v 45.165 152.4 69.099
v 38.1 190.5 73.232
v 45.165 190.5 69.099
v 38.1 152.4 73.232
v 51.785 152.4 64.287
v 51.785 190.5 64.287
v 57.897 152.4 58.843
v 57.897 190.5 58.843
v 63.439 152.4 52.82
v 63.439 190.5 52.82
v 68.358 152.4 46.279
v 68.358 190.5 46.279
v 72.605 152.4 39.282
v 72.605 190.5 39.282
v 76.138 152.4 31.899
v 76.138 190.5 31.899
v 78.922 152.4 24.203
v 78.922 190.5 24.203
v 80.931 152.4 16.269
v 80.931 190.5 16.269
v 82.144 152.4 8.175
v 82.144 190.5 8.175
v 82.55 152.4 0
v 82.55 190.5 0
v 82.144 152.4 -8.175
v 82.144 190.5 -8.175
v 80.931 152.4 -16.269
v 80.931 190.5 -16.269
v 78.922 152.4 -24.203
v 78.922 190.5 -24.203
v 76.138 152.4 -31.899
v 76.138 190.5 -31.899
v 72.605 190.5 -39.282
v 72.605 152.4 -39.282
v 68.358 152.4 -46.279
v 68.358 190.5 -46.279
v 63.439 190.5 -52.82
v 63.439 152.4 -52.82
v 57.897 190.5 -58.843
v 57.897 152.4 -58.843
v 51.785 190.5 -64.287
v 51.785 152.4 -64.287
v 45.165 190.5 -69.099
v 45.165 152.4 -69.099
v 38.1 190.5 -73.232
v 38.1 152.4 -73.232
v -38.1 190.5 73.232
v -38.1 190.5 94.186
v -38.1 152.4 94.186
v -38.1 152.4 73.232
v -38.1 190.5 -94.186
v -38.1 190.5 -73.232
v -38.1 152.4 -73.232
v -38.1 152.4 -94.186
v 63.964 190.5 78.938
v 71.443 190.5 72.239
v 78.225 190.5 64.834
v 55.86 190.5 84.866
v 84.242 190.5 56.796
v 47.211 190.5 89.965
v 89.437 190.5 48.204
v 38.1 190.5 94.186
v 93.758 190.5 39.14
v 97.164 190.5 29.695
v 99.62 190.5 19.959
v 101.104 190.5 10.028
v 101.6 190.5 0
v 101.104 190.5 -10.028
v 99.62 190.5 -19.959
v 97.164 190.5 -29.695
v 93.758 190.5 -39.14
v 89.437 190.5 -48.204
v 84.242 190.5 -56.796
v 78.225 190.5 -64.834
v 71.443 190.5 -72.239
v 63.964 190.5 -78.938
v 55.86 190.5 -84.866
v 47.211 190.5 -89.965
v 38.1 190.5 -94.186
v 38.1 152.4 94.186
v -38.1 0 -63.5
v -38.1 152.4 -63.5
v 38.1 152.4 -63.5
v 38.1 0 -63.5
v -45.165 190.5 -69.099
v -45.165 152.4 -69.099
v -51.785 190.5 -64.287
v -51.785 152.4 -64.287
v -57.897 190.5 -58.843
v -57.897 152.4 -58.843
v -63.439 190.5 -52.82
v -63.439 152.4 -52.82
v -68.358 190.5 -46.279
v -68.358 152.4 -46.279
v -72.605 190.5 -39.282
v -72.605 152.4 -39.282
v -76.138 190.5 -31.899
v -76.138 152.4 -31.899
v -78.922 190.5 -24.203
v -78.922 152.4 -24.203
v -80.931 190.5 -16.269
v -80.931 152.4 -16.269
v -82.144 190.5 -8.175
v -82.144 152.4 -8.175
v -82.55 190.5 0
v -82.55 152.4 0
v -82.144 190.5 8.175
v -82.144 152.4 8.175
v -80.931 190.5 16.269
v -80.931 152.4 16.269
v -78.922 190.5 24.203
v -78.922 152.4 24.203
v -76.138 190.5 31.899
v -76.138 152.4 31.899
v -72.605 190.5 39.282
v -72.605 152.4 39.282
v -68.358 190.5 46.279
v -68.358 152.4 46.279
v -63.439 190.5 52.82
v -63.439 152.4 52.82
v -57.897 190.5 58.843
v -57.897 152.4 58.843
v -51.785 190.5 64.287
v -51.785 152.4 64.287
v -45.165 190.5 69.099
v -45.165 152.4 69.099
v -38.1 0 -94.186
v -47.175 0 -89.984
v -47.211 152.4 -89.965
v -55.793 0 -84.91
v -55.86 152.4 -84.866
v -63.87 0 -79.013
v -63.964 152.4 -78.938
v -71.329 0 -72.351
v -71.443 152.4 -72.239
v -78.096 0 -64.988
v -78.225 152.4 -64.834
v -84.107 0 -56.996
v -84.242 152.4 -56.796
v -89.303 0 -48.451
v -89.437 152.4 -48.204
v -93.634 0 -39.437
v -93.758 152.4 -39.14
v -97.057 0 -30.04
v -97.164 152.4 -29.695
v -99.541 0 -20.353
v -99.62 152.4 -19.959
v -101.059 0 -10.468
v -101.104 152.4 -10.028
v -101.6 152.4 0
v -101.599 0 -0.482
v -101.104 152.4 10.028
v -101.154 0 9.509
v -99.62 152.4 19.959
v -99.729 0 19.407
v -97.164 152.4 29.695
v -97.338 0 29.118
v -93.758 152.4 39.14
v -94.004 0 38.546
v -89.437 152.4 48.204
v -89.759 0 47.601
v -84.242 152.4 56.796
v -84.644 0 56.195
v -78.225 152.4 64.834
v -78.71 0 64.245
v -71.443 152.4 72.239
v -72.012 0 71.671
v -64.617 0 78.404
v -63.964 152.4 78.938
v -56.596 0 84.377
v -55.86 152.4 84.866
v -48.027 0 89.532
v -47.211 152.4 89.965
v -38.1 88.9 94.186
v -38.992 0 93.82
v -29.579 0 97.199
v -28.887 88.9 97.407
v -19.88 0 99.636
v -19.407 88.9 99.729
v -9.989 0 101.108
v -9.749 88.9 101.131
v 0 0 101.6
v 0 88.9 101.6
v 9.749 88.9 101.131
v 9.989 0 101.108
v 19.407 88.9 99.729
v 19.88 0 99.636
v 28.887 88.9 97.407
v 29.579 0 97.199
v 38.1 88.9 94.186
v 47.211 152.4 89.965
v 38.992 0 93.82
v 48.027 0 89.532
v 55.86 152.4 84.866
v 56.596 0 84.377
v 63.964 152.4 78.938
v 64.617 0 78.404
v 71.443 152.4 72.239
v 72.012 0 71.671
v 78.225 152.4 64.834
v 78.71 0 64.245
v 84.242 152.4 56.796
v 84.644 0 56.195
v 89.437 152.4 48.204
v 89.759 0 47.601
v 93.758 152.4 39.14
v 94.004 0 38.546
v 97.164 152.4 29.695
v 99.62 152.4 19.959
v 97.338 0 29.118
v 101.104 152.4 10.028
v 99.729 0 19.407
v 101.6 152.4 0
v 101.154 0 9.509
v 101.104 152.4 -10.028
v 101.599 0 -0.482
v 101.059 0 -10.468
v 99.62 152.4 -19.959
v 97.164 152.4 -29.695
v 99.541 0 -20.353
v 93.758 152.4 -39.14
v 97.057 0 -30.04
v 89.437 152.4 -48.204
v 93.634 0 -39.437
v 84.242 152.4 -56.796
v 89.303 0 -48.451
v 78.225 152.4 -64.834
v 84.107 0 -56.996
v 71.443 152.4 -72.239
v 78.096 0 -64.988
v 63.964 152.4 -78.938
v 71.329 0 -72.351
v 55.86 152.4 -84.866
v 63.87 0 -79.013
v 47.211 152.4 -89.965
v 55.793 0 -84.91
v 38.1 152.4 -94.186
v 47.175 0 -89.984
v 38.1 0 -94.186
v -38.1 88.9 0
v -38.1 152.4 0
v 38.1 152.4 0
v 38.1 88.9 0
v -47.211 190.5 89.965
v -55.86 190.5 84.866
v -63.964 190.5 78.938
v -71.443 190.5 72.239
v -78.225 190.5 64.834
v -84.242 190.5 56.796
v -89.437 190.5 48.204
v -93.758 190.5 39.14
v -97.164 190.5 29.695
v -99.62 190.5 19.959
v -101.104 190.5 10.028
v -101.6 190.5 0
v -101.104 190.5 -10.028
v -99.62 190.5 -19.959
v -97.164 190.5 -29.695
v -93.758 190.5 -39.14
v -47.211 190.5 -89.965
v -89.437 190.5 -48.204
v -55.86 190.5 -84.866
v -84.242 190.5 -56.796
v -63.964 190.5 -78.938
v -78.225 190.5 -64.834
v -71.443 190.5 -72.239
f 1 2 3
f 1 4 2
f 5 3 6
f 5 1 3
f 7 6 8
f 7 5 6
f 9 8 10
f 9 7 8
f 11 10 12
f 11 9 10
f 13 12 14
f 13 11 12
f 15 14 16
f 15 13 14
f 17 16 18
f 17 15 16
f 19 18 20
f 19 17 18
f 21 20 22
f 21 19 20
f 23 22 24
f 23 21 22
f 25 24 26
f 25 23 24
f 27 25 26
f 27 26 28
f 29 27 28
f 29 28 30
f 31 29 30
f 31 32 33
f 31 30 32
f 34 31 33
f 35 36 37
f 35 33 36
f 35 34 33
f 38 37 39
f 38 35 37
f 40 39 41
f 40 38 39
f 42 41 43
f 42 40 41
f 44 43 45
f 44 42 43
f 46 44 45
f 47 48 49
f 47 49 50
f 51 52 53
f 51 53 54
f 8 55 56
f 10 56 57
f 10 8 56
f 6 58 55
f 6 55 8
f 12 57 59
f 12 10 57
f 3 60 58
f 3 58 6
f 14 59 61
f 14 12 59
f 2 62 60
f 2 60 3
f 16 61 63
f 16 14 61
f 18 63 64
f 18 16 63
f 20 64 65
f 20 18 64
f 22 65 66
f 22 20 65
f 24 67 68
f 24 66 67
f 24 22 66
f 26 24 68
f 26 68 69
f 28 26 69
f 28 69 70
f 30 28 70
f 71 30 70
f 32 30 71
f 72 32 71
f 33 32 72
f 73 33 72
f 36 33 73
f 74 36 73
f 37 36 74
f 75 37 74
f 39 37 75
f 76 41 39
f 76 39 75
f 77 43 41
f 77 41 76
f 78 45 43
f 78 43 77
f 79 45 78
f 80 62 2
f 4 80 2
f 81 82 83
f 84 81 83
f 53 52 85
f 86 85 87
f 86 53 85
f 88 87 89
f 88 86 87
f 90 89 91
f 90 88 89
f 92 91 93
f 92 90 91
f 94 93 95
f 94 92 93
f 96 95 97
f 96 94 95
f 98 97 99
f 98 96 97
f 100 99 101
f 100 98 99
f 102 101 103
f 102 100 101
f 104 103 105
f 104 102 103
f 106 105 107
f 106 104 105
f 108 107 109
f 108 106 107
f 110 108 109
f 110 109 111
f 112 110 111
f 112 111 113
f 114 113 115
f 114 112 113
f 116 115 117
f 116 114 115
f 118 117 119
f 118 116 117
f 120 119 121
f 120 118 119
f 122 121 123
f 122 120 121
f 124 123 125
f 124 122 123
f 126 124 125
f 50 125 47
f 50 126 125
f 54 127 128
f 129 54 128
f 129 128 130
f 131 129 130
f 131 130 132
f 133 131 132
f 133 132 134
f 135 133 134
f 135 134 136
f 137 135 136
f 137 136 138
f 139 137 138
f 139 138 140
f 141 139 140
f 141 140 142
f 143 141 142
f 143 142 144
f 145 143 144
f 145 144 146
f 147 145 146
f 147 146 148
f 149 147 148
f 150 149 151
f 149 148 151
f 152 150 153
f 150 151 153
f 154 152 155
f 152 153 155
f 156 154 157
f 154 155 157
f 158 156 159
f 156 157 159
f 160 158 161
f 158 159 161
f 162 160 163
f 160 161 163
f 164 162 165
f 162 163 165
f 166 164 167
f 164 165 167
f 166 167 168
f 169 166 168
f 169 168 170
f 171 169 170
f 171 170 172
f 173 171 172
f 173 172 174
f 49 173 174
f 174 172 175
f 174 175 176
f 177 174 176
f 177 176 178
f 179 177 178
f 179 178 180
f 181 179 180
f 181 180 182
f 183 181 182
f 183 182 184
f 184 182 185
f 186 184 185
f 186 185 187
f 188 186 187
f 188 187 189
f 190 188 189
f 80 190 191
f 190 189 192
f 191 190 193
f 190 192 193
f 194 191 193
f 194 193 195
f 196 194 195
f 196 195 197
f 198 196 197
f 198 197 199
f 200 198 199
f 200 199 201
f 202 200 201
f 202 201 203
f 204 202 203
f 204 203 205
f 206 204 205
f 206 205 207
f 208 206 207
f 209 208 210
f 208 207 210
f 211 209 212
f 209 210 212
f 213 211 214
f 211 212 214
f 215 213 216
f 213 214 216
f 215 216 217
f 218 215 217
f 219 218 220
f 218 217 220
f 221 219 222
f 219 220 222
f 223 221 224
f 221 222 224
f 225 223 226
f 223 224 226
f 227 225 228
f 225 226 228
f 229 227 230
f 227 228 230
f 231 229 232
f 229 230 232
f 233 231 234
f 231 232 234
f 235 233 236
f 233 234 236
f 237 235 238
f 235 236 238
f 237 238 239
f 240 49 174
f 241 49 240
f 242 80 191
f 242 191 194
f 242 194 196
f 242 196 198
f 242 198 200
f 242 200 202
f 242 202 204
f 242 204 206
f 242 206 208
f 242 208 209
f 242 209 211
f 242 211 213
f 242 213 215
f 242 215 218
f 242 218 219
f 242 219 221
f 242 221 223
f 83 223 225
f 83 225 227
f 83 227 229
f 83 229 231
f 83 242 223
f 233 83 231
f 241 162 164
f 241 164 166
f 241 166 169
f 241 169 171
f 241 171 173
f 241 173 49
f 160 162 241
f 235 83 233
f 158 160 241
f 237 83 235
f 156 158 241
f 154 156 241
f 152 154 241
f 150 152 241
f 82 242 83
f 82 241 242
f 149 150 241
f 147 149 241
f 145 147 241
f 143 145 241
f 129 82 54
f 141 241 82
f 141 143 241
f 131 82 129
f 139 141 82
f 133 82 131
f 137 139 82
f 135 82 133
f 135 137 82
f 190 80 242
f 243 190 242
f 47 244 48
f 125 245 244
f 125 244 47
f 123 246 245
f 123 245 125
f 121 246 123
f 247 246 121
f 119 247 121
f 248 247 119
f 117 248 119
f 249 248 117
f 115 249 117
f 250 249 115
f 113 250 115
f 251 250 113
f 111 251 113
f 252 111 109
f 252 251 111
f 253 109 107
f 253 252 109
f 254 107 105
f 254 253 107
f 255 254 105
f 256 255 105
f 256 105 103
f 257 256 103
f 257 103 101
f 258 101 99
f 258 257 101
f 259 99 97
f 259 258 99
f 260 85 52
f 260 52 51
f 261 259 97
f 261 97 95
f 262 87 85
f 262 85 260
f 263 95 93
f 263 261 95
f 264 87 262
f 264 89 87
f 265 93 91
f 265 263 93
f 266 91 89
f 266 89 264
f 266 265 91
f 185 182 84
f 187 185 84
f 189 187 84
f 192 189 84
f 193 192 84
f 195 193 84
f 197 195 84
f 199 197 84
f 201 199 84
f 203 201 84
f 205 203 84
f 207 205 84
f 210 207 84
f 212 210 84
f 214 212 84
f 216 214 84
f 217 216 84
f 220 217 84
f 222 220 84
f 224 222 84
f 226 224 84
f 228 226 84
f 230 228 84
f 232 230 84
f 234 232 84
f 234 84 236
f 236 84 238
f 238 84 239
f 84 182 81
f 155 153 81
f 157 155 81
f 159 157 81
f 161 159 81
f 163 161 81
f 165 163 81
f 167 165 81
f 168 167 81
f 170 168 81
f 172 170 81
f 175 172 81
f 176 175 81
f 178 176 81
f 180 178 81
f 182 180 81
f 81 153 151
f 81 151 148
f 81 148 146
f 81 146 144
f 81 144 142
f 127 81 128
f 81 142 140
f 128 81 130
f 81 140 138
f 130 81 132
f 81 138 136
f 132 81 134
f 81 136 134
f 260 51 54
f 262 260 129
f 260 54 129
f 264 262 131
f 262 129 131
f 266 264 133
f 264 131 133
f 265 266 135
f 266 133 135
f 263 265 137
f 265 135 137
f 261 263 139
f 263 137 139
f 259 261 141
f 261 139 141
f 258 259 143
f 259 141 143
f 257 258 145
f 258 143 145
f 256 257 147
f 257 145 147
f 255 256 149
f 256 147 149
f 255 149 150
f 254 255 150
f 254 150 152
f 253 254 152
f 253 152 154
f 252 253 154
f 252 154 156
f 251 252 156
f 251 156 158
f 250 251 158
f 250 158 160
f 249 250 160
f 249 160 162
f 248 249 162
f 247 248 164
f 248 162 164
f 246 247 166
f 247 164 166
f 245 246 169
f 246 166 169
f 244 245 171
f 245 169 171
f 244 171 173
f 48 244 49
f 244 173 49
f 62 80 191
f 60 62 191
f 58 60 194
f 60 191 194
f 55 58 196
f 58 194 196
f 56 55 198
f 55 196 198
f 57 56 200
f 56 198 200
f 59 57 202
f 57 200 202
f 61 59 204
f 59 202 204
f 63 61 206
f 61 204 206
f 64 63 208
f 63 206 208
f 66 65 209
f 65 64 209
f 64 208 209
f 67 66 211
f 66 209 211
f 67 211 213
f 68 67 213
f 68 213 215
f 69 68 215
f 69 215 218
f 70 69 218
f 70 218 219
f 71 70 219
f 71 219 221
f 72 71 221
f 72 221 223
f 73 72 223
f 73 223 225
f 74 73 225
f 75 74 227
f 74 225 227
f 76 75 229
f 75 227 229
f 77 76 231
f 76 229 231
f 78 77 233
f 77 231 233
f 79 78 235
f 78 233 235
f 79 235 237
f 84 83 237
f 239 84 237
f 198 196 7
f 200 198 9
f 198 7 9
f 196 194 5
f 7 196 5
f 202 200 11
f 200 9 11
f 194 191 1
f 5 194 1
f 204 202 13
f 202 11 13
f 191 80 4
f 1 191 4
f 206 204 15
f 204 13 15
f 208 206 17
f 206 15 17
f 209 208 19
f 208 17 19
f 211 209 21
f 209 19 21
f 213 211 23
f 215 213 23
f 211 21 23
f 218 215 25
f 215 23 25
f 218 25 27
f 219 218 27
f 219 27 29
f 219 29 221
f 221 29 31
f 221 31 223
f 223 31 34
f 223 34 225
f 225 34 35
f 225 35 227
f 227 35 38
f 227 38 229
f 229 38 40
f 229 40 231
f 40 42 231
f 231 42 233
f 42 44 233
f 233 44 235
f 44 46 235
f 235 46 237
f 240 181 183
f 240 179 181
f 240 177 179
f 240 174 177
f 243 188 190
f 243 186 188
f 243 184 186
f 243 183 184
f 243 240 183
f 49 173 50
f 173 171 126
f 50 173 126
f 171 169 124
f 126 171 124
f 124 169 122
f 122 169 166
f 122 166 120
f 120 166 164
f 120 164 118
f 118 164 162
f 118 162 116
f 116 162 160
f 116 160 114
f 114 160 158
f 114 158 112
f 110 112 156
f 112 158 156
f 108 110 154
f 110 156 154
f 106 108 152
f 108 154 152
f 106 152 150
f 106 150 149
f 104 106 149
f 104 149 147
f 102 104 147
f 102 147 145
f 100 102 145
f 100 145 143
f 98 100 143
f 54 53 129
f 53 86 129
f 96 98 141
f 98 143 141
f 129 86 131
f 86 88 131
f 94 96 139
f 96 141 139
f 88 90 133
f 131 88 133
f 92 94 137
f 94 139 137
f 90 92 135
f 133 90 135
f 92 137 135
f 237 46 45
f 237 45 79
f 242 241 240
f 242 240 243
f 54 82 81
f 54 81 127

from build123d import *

# Parameters (mm, degrees)
SKETCH2_R           = 101.6
BOSS_EXTRUDE1_DEPTH = 152.4
SKETCH3_R           = 101.6
SKETCH3_R_2         = 82.55
BOSS_EXTRUDE2_DEPTH = 38.1
SKETCH4_W           = 76.2
SKETCH4_H           = 101.6
CUT_EXTRUDE1_DEPTH  = 101.6
SKETCH5_W           = 76.2
SKETCH5_H           = 38.1
CUT_EXTRUDE2_DEPTH  = 239.611336696


with BuildPart() as part:
    # Sketch2 → Boss-Extrude1 (new body)
    with BuildSketch(Plane(origin=(0, 0, 0), x_dir=(1, 0, 0), z_dir=(0, 1, 0))):
        with Locations(Location((0, 0, 0), (0, 0, 90))):
            Circle(SKETCH2_R)
    extrude(amount=BOSS_EXTRUDE1_DEPTH)


with BuildPart() as body_2:
    # Sketch3 → Boss-Extrude2 (new body)
    with BuildSketch(Plane(origin=(0, 152.4, 0), x_dir=(1, 0, 0), z_dir=(0, 1, 0))):
        with Locations(Location((0, 0, 0), (0, 0, 90))):
            Circle(SKETCH3_R)
        with Locations(Location((0, 0, 0), (0, 0, 90))):
            Circle(SKETCH3_R_2, mode=Mode.SUBTRACT)
    extrude(amount=BOSS_EXTRUDE2_DEPTH)


with BuildPart() as cut_extrude1_tool:
    # Sketch4 → Cut-Extrude1 (new body)
    with BuildSketch(Plane(origin=(0, 190.5, 0), x_dir=(1, 0, 0), z_dir=(0, 1, 0))):
        with Locations((0, -50.8)):
            Rectangle(SKETCH4_W, SKETCH4_H)
    extrude(amount=-CUT_EXTRUDE1_DEPTH)


with BuildPart() as part_1:
    add(part.part)

    # Cut-Extrude1: cut by cut_extrude1_tool
    add(cut_extrude1_tool.part, mode=Mode.SUBTRACT)


with BuildPart() as body_2_1:
    add(body_2.part)

    # Cut-Extrude1: cut by cut_extrude1_tool
    add(cut_extrude1_tool.part, mode=Mode.SUBTRACT)


with BuildPart() as cut_extrude2_tool:
    # Sketch5 → Cut-Extrude2 (new, through all)
    with BuildSketch(Plane(origin=(0, 190.5, 0), x_dir=(1, 0, 0), z_dir=(0, 1, 0))):
        with Locations((0, 82.55)):
            Rectangle(SKETCH5_W, SKETCH5_H)
    extrude(amount=-CUT_EXTRUDE2_DEPTH)


with BuildPart() as part_2:
    add(part_1.part)

    # Cut-Extrude2: cut by cut_extrude2_tool
    add(cut_extrude2_tool.part, mode=Mode.SUBTRACT)


with BuildPart() as body_2_2:
    add(body_2_1.part)

    # Cut-Extrude2: cut by cut_extrude2_tool
    add(cut_extrude2_tool.part, mode=Mode.SUBTRACT)


solid = Compound([part_2.part, body_2_2.part])
